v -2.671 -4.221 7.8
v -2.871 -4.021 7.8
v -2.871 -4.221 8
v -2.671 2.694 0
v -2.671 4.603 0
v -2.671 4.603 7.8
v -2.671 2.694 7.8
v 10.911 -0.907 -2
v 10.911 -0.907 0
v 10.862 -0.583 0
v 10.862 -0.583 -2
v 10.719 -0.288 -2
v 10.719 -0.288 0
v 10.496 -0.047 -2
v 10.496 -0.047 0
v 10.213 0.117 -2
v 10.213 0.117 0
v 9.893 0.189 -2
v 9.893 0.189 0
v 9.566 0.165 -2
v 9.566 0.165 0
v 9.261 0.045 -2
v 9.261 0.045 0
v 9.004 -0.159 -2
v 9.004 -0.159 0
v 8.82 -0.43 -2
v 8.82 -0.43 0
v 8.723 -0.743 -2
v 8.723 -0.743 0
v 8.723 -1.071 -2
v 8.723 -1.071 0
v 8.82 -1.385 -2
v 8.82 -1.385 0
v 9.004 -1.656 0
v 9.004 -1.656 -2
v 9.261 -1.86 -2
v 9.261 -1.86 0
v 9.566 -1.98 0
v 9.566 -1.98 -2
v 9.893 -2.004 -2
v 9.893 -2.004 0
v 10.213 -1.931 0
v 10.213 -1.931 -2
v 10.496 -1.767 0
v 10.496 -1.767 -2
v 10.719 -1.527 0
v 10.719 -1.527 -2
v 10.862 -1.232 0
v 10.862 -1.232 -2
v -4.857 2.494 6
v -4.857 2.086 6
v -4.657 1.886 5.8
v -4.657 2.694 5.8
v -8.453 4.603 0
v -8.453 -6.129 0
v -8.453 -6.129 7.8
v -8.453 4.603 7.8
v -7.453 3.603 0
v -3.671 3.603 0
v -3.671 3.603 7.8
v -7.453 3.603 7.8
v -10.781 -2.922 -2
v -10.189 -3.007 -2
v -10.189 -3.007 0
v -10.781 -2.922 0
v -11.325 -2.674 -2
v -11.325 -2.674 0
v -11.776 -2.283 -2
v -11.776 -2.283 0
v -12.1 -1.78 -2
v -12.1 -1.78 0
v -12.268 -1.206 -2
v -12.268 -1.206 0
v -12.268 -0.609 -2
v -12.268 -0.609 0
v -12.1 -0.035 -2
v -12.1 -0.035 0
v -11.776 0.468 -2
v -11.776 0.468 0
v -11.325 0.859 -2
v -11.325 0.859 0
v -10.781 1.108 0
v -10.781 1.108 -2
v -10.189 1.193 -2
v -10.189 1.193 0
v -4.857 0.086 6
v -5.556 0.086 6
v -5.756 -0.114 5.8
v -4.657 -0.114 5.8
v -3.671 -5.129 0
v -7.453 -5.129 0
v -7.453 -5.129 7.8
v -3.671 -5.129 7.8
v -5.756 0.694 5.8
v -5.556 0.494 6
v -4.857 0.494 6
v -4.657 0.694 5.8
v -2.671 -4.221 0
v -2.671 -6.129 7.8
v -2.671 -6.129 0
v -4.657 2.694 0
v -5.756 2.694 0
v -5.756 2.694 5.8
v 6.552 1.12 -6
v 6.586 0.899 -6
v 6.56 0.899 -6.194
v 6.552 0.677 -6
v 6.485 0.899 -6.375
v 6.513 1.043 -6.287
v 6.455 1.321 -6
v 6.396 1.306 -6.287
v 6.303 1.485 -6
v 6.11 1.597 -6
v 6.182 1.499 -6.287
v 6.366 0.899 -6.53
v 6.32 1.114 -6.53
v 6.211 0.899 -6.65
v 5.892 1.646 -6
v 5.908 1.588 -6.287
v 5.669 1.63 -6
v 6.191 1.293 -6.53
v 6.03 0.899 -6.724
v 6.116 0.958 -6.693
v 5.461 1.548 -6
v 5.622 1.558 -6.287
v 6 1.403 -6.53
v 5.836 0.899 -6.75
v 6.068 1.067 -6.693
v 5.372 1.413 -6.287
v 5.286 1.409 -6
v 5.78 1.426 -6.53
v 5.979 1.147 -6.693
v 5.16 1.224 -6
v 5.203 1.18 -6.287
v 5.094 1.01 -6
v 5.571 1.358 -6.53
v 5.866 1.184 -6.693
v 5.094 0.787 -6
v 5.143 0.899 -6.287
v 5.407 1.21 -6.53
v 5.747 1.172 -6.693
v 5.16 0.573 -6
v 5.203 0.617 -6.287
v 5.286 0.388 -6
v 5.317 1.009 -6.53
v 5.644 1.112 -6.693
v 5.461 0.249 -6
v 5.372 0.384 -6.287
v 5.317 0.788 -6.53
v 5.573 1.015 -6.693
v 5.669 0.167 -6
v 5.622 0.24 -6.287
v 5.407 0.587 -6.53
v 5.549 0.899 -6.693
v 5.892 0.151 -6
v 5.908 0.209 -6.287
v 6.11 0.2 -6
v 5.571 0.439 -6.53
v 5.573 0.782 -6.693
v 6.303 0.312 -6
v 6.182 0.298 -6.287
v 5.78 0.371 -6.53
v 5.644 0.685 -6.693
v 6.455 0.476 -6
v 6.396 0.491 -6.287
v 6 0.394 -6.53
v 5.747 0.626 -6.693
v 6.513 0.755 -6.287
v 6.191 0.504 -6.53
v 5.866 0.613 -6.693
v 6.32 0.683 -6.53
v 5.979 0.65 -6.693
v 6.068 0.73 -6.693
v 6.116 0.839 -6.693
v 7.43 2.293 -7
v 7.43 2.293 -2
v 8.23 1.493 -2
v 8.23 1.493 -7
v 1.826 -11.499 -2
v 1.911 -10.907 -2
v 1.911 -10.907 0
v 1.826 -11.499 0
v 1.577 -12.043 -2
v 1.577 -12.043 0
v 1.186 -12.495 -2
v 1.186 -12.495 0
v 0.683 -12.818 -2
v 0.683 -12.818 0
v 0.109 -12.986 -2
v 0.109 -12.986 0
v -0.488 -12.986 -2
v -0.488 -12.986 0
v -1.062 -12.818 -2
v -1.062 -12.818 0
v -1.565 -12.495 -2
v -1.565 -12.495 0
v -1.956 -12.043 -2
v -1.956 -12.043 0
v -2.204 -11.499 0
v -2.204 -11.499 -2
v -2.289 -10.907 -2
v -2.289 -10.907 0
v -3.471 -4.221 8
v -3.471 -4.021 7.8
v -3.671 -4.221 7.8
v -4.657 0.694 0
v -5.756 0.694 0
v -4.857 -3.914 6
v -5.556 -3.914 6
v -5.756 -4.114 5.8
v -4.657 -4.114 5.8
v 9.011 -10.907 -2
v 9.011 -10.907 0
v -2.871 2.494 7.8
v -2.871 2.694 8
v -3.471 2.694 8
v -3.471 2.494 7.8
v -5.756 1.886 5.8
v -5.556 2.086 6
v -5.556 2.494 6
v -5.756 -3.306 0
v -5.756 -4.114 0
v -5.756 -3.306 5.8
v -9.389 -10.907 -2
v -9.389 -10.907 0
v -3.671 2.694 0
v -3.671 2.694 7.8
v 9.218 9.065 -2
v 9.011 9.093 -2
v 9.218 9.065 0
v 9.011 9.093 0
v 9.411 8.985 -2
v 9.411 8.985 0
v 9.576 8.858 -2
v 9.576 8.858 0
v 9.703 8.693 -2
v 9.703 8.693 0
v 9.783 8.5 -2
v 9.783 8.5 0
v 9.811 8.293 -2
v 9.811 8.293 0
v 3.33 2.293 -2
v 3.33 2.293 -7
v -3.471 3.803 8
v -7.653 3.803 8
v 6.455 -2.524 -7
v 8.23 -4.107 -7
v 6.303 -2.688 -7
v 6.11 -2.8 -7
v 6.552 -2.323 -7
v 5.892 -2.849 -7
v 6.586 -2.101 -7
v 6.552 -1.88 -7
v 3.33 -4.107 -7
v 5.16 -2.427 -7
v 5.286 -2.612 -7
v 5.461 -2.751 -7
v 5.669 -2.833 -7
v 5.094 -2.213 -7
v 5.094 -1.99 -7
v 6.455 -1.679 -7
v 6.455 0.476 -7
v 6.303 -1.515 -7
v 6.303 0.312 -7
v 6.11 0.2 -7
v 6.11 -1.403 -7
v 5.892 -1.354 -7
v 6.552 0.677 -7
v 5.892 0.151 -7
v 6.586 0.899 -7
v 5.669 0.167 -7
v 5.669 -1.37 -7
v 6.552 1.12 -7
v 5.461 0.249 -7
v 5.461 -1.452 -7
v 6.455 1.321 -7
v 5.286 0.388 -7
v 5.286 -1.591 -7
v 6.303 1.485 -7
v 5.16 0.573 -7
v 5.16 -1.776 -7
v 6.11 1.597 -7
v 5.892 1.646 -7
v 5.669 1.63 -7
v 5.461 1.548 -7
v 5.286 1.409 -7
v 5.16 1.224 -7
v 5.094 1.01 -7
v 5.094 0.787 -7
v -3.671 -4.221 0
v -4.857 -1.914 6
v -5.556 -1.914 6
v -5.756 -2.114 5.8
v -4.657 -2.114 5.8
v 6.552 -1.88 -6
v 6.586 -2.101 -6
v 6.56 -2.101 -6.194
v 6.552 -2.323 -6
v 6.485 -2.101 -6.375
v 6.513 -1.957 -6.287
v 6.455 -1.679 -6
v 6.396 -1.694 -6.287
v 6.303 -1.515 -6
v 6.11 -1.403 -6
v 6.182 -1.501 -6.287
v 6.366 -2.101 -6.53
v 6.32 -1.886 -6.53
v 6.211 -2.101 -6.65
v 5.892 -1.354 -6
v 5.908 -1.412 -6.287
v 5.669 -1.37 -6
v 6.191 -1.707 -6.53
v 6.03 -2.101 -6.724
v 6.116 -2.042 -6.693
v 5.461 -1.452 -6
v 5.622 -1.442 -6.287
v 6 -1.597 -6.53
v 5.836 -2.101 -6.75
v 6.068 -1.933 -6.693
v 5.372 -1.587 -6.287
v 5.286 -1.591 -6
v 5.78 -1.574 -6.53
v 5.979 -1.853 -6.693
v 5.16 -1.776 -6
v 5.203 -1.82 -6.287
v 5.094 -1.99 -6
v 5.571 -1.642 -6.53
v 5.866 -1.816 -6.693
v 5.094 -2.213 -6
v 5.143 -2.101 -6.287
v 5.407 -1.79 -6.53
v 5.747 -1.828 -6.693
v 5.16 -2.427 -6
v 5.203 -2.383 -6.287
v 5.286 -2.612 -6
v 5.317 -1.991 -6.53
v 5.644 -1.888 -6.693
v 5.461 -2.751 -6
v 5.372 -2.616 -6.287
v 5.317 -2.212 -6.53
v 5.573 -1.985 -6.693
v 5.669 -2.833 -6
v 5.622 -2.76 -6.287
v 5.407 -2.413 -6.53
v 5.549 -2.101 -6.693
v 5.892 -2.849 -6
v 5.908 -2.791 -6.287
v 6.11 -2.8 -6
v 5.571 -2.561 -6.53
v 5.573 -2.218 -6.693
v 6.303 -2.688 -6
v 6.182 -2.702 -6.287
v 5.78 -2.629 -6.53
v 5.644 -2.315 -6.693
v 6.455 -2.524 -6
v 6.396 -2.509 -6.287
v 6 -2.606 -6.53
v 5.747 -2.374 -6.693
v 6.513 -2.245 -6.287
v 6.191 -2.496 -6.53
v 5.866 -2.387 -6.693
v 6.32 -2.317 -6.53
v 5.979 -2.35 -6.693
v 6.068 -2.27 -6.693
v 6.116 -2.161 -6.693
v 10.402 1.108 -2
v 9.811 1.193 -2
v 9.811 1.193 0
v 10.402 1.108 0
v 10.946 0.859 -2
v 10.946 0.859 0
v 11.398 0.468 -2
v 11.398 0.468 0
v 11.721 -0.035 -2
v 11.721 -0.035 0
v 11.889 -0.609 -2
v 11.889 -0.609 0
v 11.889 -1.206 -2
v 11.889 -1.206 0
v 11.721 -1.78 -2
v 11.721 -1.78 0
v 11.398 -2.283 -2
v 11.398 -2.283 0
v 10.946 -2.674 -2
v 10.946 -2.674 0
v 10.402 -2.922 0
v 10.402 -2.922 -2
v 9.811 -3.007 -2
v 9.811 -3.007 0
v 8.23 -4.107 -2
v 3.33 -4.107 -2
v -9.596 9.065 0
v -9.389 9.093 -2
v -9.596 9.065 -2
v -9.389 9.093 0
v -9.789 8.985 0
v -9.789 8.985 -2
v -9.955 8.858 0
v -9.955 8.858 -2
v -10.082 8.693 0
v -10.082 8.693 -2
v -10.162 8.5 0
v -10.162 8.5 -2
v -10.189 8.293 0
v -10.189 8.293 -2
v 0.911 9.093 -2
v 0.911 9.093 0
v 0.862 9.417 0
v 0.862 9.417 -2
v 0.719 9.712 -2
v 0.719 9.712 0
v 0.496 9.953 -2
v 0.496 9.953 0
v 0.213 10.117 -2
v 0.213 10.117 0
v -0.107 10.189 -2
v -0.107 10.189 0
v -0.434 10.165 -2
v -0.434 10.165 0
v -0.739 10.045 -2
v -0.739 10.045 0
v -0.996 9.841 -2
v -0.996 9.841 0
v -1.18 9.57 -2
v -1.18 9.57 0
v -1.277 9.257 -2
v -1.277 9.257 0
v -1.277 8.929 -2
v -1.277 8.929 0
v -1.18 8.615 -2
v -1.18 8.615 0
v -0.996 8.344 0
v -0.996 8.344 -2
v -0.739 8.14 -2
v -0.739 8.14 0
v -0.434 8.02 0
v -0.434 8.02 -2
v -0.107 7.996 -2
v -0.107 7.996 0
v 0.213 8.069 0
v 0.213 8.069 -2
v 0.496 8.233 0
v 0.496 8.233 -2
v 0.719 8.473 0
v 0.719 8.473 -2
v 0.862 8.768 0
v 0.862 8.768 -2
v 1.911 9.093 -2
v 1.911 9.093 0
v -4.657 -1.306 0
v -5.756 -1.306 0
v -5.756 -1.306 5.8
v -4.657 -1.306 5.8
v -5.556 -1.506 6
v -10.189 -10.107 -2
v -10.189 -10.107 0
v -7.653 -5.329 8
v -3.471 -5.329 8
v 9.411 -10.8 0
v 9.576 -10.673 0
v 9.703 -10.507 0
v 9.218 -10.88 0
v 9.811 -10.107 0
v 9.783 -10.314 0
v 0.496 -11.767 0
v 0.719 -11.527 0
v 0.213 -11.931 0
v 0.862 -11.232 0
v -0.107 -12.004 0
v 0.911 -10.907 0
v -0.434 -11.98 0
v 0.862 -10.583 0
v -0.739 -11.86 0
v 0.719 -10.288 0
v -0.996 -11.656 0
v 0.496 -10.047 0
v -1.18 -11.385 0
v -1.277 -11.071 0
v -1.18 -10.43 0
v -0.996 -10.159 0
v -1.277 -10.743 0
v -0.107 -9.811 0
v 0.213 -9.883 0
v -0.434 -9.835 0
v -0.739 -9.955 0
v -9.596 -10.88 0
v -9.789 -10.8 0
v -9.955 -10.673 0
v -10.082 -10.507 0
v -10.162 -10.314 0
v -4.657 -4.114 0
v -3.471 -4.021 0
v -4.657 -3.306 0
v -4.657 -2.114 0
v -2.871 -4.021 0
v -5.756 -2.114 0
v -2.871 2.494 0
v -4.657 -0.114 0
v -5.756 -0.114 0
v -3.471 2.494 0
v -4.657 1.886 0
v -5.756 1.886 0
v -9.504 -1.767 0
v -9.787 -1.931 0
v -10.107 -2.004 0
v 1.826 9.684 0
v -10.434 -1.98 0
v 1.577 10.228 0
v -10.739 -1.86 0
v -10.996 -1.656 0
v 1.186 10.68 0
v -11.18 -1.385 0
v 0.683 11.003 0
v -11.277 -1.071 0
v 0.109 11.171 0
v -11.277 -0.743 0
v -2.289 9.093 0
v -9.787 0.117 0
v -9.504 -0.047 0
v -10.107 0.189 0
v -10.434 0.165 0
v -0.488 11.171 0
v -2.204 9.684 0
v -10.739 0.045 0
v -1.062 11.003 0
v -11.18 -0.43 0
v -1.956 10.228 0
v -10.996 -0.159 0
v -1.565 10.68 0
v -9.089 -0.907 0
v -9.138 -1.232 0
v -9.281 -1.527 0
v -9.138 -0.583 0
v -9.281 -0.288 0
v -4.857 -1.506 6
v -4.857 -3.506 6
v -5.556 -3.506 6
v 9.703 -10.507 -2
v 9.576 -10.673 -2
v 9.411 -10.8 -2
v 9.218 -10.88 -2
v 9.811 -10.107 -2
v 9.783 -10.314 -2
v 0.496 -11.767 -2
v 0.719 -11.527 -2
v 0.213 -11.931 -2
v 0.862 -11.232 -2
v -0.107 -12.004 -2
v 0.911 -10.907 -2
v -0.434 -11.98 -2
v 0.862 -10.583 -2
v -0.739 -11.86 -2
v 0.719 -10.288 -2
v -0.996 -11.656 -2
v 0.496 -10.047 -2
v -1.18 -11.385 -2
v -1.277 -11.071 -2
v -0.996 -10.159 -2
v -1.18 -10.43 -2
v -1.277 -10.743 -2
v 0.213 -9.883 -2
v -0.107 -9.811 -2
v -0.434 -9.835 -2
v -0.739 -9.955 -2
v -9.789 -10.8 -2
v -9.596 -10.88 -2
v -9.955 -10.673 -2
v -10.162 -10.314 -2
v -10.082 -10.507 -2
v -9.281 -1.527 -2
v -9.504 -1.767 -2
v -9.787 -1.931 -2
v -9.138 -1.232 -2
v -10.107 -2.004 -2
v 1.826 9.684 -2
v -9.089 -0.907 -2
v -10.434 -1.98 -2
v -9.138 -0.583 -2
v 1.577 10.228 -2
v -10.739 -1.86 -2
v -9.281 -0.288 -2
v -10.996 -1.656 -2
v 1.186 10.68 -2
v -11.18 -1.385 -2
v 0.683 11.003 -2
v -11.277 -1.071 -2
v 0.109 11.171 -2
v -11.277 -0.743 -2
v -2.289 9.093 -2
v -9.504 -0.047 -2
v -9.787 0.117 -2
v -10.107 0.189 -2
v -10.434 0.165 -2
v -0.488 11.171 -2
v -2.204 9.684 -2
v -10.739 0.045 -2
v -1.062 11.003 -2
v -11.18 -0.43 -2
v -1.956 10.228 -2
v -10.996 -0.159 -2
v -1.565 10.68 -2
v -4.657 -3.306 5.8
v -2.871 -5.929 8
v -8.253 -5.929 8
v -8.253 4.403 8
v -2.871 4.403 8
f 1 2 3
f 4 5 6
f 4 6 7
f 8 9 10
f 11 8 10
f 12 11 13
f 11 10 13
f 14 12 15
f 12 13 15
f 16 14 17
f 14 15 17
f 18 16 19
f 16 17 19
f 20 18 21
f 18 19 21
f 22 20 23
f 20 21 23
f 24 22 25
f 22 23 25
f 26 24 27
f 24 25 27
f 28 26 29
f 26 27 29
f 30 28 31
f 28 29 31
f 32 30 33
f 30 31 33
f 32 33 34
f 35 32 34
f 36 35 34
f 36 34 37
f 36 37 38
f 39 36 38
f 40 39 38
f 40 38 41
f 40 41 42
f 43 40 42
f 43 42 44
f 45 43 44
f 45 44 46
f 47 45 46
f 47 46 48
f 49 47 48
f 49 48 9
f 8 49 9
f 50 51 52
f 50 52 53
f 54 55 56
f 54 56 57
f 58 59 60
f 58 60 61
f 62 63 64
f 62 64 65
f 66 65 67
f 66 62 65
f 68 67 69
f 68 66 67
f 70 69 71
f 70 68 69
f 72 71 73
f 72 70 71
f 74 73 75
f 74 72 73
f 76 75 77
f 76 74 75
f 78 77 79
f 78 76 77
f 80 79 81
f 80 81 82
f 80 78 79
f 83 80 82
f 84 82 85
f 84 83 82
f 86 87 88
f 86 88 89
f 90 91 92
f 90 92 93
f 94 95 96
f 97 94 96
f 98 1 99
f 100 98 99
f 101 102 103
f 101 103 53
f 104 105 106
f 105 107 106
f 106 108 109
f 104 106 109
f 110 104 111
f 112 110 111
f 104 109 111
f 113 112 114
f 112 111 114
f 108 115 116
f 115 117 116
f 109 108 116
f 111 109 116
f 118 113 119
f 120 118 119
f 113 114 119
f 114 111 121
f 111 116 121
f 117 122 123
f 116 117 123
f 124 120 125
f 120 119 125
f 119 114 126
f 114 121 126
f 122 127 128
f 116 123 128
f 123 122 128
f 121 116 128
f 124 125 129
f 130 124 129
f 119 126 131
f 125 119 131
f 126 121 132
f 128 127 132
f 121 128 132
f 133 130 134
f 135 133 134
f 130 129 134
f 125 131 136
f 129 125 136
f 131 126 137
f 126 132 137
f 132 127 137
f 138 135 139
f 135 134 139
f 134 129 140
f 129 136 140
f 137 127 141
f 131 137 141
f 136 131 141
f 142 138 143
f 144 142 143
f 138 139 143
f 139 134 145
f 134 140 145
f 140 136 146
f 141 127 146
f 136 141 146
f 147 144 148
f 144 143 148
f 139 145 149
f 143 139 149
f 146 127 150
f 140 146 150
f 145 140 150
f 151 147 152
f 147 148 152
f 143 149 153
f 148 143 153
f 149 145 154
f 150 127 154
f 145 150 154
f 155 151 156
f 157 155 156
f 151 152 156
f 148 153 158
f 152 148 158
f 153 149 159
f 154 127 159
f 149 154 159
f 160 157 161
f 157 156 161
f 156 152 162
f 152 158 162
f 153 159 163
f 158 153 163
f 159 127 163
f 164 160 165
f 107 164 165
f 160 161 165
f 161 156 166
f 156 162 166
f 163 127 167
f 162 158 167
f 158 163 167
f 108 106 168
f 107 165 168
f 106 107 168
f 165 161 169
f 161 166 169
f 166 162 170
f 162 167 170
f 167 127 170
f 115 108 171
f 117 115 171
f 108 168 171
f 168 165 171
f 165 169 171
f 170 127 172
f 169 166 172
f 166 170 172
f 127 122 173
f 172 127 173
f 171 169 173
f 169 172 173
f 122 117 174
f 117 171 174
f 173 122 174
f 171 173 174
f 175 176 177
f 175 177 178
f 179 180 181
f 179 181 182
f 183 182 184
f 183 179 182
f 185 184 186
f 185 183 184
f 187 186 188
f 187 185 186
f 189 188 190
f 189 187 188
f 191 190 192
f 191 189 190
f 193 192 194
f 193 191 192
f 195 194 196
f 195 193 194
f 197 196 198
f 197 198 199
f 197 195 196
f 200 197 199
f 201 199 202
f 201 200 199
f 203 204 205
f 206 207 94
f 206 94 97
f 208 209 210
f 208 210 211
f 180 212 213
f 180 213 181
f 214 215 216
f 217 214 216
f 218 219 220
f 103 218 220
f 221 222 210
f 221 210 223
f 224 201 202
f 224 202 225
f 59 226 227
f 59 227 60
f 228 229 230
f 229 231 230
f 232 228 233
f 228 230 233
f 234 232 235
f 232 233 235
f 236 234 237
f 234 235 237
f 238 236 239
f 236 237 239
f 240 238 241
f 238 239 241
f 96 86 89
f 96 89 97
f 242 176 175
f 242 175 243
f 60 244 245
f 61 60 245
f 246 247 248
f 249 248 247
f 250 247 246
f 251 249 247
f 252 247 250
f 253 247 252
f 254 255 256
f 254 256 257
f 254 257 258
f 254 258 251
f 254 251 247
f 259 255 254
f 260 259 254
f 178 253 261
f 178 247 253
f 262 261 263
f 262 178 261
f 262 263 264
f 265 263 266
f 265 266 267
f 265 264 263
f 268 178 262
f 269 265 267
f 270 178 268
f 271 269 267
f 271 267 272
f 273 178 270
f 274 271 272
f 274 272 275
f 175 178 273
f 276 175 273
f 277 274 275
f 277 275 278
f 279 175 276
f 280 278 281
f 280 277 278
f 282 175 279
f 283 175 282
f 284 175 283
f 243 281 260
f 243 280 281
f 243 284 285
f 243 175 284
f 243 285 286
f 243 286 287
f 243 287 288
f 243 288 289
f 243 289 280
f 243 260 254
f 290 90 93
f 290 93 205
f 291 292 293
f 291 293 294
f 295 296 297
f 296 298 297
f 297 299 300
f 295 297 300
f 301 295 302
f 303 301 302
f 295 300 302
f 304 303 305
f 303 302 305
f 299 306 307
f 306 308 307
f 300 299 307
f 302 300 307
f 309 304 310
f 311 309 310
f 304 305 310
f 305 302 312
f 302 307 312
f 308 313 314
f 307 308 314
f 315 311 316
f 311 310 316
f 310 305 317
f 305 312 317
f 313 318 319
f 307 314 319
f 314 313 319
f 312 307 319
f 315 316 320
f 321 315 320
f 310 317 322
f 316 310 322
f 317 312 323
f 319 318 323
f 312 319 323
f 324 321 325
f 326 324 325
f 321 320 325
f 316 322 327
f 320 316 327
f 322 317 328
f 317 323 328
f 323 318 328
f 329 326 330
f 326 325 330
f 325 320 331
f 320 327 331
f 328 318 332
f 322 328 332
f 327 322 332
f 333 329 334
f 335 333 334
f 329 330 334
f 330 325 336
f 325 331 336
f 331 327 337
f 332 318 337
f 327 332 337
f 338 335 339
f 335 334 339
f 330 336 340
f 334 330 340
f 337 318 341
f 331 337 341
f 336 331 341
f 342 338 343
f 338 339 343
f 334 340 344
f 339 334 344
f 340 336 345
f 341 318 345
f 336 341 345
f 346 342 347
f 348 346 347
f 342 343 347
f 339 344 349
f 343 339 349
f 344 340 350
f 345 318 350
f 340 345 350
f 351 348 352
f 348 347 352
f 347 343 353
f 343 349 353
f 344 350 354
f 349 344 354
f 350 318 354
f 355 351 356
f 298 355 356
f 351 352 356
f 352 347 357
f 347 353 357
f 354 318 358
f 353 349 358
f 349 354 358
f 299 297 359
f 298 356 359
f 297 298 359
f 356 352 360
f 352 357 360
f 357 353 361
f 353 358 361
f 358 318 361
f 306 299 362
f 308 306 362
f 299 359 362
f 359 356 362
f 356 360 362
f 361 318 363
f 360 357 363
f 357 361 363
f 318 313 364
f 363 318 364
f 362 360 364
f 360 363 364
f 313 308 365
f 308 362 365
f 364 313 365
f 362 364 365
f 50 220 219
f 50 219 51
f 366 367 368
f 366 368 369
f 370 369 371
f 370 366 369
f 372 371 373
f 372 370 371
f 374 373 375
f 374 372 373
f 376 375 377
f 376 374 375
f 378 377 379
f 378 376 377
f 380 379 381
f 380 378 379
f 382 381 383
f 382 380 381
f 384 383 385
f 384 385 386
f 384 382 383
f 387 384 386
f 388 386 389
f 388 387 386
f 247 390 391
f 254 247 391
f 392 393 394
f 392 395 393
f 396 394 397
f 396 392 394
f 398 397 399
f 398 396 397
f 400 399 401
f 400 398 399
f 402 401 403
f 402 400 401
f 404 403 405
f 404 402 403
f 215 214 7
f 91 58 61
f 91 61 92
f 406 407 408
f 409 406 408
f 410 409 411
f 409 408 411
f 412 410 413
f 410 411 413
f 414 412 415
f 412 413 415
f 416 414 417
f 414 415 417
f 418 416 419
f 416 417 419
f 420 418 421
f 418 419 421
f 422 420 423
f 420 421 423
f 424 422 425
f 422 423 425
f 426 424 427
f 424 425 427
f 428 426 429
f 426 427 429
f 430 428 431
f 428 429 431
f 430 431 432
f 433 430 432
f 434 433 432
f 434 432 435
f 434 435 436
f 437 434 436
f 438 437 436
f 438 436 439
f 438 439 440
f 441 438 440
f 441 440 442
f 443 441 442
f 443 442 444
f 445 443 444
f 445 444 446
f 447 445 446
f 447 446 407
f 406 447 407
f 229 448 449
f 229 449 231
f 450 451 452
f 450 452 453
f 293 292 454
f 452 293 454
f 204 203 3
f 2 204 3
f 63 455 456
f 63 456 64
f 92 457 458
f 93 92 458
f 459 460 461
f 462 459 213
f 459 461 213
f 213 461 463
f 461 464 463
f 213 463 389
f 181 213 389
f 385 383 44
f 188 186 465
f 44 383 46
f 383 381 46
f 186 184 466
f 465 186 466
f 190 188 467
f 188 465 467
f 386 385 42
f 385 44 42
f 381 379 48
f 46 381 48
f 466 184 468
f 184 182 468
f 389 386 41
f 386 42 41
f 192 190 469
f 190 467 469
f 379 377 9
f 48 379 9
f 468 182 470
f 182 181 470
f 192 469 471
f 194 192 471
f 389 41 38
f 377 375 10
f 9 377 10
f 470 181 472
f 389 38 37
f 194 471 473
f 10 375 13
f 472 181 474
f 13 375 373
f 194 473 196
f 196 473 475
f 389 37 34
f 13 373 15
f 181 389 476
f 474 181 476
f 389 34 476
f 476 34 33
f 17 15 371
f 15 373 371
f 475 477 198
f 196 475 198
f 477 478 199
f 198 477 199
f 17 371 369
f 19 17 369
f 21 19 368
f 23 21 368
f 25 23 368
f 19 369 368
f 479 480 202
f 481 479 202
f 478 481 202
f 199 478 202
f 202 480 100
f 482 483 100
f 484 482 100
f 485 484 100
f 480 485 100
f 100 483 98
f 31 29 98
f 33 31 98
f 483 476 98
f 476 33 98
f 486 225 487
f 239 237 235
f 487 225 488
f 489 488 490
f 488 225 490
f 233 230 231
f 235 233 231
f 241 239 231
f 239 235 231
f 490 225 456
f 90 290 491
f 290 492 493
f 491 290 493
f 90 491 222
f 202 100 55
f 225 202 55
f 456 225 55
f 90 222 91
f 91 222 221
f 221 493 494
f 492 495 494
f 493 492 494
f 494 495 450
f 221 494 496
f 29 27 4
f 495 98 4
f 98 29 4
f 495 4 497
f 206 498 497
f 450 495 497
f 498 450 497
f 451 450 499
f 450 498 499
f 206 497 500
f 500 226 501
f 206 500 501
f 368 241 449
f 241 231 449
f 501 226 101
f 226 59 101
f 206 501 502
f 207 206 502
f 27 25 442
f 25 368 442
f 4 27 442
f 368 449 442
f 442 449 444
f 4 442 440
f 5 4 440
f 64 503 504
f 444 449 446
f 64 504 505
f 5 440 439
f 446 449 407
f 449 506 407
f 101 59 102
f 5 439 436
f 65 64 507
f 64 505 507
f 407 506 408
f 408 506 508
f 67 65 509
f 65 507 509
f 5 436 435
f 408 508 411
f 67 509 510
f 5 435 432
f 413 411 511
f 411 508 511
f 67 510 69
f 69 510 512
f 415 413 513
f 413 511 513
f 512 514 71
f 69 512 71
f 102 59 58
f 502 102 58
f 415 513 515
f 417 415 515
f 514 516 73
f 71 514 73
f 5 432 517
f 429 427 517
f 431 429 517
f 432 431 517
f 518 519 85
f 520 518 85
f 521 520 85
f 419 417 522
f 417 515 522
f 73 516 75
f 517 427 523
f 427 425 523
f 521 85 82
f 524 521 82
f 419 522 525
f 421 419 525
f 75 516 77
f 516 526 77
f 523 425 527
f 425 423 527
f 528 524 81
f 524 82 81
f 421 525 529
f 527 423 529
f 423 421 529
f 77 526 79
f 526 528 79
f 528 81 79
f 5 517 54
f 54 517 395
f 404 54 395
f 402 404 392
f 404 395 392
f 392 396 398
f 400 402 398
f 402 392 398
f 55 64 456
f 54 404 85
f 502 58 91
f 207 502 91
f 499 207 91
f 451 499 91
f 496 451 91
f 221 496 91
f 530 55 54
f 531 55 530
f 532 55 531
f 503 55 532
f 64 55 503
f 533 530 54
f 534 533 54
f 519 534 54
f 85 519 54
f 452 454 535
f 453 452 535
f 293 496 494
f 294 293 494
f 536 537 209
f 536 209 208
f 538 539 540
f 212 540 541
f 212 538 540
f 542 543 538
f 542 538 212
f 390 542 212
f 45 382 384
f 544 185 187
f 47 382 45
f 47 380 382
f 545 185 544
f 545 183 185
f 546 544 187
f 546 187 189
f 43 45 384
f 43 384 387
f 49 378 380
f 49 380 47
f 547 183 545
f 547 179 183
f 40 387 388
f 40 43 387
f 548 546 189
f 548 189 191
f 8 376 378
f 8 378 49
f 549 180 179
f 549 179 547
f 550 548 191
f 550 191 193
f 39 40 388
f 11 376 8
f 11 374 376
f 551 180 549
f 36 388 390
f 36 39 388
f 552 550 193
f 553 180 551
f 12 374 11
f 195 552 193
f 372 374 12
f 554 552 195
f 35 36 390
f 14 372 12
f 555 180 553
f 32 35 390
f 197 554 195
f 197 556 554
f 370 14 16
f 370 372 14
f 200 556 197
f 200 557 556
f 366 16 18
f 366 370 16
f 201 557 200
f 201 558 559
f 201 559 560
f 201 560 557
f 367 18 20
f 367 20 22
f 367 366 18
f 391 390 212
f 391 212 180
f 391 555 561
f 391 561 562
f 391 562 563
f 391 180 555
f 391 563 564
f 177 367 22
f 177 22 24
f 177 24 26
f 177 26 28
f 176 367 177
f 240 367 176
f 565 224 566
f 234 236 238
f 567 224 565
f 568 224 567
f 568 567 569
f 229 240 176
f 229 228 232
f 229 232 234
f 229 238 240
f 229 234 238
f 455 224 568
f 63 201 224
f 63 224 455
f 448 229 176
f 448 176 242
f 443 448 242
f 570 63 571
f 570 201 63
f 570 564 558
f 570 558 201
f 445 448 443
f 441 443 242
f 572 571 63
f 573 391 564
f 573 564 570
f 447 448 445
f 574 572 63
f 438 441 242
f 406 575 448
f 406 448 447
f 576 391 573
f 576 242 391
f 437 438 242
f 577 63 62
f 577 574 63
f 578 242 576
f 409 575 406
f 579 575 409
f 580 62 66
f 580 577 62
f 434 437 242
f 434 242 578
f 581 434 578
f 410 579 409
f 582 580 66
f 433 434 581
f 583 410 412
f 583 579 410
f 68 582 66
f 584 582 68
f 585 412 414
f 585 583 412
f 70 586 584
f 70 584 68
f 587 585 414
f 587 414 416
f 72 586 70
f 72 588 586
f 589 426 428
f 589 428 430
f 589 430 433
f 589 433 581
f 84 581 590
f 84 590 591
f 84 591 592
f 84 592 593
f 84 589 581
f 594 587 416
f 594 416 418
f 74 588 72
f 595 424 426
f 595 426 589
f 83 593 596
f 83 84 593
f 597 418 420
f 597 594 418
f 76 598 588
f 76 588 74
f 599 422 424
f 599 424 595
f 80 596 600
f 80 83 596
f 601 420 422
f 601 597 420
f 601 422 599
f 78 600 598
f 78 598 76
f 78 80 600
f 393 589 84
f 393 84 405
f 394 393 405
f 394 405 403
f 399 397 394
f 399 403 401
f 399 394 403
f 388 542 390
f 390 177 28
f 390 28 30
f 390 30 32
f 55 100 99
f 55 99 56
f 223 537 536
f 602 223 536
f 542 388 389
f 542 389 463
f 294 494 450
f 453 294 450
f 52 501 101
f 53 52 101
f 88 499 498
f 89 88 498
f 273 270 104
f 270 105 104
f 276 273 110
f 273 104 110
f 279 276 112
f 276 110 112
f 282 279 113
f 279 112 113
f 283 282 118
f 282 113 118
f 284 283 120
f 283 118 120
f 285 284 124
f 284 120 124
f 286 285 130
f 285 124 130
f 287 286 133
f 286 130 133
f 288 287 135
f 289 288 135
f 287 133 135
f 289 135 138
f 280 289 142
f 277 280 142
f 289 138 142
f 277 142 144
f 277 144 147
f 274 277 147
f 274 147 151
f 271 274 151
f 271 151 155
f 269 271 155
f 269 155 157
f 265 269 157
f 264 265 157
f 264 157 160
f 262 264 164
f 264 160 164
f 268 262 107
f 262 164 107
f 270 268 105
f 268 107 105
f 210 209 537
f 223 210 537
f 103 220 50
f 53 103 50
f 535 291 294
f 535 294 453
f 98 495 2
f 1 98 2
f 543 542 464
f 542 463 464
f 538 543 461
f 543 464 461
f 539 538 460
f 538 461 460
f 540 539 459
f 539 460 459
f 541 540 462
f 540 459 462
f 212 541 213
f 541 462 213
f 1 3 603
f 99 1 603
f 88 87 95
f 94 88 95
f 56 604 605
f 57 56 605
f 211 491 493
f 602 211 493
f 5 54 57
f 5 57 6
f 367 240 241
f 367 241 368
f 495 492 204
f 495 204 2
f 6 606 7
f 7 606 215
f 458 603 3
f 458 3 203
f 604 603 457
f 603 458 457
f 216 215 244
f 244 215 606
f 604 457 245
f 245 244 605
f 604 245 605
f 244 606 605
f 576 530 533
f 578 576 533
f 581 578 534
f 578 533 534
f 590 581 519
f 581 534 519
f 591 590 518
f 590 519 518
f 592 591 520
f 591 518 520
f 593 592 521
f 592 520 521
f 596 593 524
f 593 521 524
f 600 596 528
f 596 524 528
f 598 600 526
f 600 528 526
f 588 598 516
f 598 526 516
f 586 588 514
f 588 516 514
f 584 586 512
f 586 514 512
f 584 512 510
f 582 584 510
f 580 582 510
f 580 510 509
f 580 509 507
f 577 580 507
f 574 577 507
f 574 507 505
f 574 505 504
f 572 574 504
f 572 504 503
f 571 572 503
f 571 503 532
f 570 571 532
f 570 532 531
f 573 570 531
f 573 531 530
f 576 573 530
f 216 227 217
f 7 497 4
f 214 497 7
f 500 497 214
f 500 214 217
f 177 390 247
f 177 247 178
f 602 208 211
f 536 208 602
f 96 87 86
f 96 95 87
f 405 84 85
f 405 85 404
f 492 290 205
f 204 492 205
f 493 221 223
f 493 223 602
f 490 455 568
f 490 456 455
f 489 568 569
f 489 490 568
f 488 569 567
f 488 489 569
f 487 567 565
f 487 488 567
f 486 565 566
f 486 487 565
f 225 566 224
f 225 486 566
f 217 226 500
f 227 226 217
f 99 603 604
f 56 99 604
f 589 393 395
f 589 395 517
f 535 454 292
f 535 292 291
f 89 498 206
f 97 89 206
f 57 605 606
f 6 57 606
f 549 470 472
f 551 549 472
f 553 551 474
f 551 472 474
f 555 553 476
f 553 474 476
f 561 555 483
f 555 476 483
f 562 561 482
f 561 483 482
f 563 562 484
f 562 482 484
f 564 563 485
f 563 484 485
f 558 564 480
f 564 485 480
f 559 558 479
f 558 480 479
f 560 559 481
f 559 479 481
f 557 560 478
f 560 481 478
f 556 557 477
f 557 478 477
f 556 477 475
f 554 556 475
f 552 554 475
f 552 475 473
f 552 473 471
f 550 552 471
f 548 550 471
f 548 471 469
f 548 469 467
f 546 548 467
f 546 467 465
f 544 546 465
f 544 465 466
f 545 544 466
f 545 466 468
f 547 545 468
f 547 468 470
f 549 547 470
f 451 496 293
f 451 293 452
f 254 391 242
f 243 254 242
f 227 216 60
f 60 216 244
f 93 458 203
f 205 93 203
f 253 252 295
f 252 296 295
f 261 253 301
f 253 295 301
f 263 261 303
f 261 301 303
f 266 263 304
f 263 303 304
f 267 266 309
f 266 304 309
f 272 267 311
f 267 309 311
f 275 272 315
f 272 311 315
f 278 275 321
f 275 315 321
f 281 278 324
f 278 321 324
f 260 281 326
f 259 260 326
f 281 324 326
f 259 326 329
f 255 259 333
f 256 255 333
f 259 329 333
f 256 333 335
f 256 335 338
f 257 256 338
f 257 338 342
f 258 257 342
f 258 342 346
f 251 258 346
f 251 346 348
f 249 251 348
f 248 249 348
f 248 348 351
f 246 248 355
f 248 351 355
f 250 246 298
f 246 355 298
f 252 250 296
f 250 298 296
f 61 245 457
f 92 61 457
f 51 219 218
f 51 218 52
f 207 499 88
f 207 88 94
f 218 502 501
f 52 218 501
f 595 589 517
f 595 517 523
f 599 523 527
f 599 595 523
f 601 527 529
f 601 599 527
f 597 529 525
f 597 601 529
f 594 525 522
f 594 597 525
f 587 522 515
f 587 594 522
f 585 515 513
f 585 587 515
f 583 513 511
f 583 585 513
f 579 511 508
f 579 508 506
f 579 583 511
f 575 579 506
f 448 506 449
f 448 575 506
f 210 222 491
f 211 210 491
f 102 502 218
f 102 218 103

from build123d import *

# Parameters (mm, degrees)
BOSS_EXTRUDE1_DEPTH   = 2
BOSS_EXTRUDE2_DEPTH   = 8
SKETCH3_W             = 1.099637712
SKETCH3_H             = 0.808368405
BOSS_EXTRUDE3_DEPTH   = 6
SKETCH4_W             = 1.099637712
SKETCH4_H             = 0.808368405
BOSS_EXTRUDE4_DEPTH   = 6
SKETCH5_W             = 1.099637712
SKETCH5_H             = 0.808368405
BOSS_EXTRUDE5_DEPTH   = 6
SKETCH6_W             = 1.099637712
SKETCH6_H             = 0.808368405
BOSS_EXTRUDE6_DEPTH   = 6
SKETCH7_W             = 4.9
SKETCH7_H             = 6.4
BOSS_EXTRUDE7_DEPTH   = 5
F_1_CLEARANCE_HOLE1_D = 2.20000068
CHAMFER1_SIZE         = 0.2
CHAMFER2_SIZE         = 0.8
FILLET1_R             = 0.8


# Read off the part's stored shape, not the designer's step: Cut-Extrude1, Cut-Extrude2
with BuildPart() as part:
    # Sketch1 → Boss-Extrude1 (new body)
    with BuildSketch(Plane(origin=(0, 0, -2), x_dir=(-1, 0, 0), z_dir=(0, 0, -1))):
        with BuildLine():
            Line((-1.910632622, 9.092570703), (-9.810632622, 9.092570703))
            Line((-9.810632622, 9.092570703), (-9.810632622, 1.192570703))
            ThreePointArc((-9.810632622, 1.192570703), (-11.910632622, -0.907429297), (-9.810632622, -3.007429297))
            Line((-9.810632622, -3.007429297), (-9.810632622, -10.907429297))
            Line((-9.810632622, -10.907429297), (-1.910632622, -10.907429297))
            ThreePointArc((-1.910632622, -10.907429297), (0.189367378, -13.007429297), (2.289367378, -10.907429297))
            Line((2.289367378, -10.907429297), (10.189367378, -10.907429297))
            Line((10.189367378, -10.907429297), (10.189367378, -3.007429297))
            ThreePointArc((10.189367378, -3.007429297), (12.289367378, -0.907429297), (10.189367378, 1.192570703))
            Line((10.189367378, 1.192570703), (10.189367378, 9.092570703))
            Line((10.189367378, 9.092570703), (2.289367378, 9.092570703))
            ThreePointArc((2.289367378, 9.092570703), (0.189367378, 11.192570703), (-1.910632622, 9.092570703))
        make_face()
    extrude(amount=-BOSS_EXTRUDE1_DEPTH)

    # Sketch2 → Boss-Extrude2 (add)
    with BuildSketch(Plane.XY):
        Polygon((-2.670547611, -4.020890836), (-2.670547611, -6.129443348), (-8.453284272, -6.129443348), (-8.453284272, 4.602710154), (-2.670547611, 4.602710154), (-2.670547611, 2.494157643), (-3.670547611, 2.494157643), (-3.670547611, 3.602710154), (-7.453284272, 3.602710154), (-7.453284272, -5.129443348), (-3.670547611, -5.129443348), (-3.670547611, -4.020890836), align=None)
    extrude(amount=BOSS_EXTRUDE2_DEPTH)

    # Sketch3 → Boss-Extrude3 (add)
    with BuildSketch(Plane.XY):
        with Locations((-5.206678265, -1.71002656)):
            Rectangle(SKETCH3_W, SKETCH3_H)
    extrude(amount=BOSS_EXTRUDE3_DEPTH)

    # Sketch4 → Boss-Extrude4 (add)
    with BuildSketch(Plane.XY):
        with Locations((-5.206678265, 2.28997344)):
            Rectangle(SKETCH4_W, SKETCH4_H)
    extrude(amount=BOSS_EXTRUDE4_DEPTH)

    # Sketch5 → Boss-Extrude5 (add)
    with BuildSketch(Plane.XY):
        with Locations((-5.206678265, 0.289973441)):
            Rectangle(SKETCH5_W, SKETCH5_H)
    extrude(amount=BOSS_EXTRUDE5_DEPTH)

    # Sketch6 → Boss-Extrude6 (add)
    with BuildSketch(Plane.XY):
        with Locations((-5.206678265, -3.71002656)):
            Rectangle(SKETCH6_W, SKETCH6_H)
    extrude(amount=BOSS_EXTRUDE6_DEPTH)

    # Sketch7 → Boss-Extrude7 (add)
    with BuildSketch(Plane(origin=(0, 0, -2), x_dir=(-1, 0, 0), z_dir=(0, 0, -1))):
        with Locations((-5.779682622, -0.907429297)):
            Rectangle(SKETCH7_W, SKETCH7_H)
    extrude(amount=BOSS_EXTRUDE7_DEPTH)

    # Cut-Extrude1 outline → Cut-Extrude1 (revolve, cut)
    with BuildSketch(Plane(origin=(5.83567735, -2.101434569, 0), x_dir=(1, 0, 0), z_dir=(0, -1, 0))):
        with BuildLine():
            Line((0.75, -7), (0.75, -6))
            ThreePointArc((0.75, -6), (0.530330086, -6.530330086), (0, -6.75))
            Line((0, -6.75), (0, -7))
            Line((0, -7), (0.75, -7))
        make_face()
    revolve(axis=Axis((5.83567735, -2.101434569, 0), (0, 0, 1)), mode=Mode.SUBTRACT)

    # Cut-Extrude2 outline → Cut-Extrude2 (revolve, cut)
    with BuildSketch(Plane(origin=(5.83567735, 0.898565431, 0), x_dir=(1, 0, 0), z_dir=(0, -1, 0))):
        with BuildLine():
            Line((0.75, -7), (0.75, -6))
            ThreePointArc((0.75, -6), (0.530330086, -6.530330086), (0, -6.75))
            Line((0, -6.75), (0, -7))
            Line((0, -7), (0.75, -7))
        make_face()
    revolve(axis=Axis((5.83567735, 0.898565431, 0), (0, 0, 1)), mode=Mode.SUBTRACT)

    # #1 Clearance Hole1 (through all)
    with Locations(Plane(origin=(0, 0, -2), x_dir=(-1, 0, 0), z_dir=(0, 0, -1))):
        with Locations((0.189367378, -10.907429297), (0.189367378, 9.092570703), (10.189367378, -0.907429297), (-9.810632622, -0.907429297)):
            Hole(F_1_CLEARANCE_HOLE1_D / 2)

    # Chamfer1
    chamfer1_edges = [part.edges().sort_by_distance(p)[0] for p in [
        (-5.206678265, -0.114210762, 6),
        (-4.656859409, 0.28997344, 6),
        (-5.206678265, 0.694157643, 6),
        (-5.756497121, 0.28997344, 6),
        (-5.206678265, -3.305842357, 6),
        (-5.756497121, -3.71002656, 6),
        (-5.206678265, -4.114210762, 6),
        (-4.656859409, -3.71002656, 6),
        (-2.670547611, -4.020890836, 4),
        (-3.670547611, -4.020890836, 4),
        (-3.670547611, 2.494157643, 4),
        (-2.670547611, 2.494157643, 4),
        (-3.170547611, -4.020890836, 8),
        (-3.670547611, -4.575167092, 8),
        (-5.561915941, -5.129443348, 8),
        (-7.453284272, -0.763366597, 8),
        (-5.561915941, 3.602710154, 8),
        (-3.670547611, 3.048433899, 8),
        (-3.170547611, 2.494157643, 8),
        (-2.670547611, 3.548433899, 8),
        (-5.561915941, 4.602710154, 8),
        (-8.453284272, -0.763366597, 8),
        (-5.561915941, -6.129443348, 8),
        (-2.670547611, -5.075167092, 8),
        (-4.656859409, -1.71002656, 6),
        (-5.206678265, -1.305842357, 6),
        (-5.756497121, -1.71002656, 6),
        (-5.206678265, -2.114210762, 6),
        (-4.656859409, 2.28997344, 6),
        (-5.206678265, 2.694157643, 6),
        (-5.756497121, 2.28997344, 6),
        (-5.206678265, 1.885789238, 6),
    ]]
    chamfer(chamfer1_edges, length=CHAMFER1_SIZE)

    # Chamfer2
    chamfer2_edges = [part.edges().sort_by_distance(p)[0] for p in [
        (8.229682622, 2.292570703, -4.5),
    ]]
    chamfer(chamfer2_edges, length=CHAMFER2_SIZE)

    # Fillet1
    fillet1_edges = [part.edges().sort_by_distance(p)[0] for p in [
        (-10.189367378, 9.092570703, -1),
        (-10.189367378, -10.907429297, -1),
        (9.810632622, -10.907429297, -1),
        (9.810632622, 9.092570703, -1),
    ]]
    fillet(fillet1_edges, radius=FILLET1_R)


solid = part.part
